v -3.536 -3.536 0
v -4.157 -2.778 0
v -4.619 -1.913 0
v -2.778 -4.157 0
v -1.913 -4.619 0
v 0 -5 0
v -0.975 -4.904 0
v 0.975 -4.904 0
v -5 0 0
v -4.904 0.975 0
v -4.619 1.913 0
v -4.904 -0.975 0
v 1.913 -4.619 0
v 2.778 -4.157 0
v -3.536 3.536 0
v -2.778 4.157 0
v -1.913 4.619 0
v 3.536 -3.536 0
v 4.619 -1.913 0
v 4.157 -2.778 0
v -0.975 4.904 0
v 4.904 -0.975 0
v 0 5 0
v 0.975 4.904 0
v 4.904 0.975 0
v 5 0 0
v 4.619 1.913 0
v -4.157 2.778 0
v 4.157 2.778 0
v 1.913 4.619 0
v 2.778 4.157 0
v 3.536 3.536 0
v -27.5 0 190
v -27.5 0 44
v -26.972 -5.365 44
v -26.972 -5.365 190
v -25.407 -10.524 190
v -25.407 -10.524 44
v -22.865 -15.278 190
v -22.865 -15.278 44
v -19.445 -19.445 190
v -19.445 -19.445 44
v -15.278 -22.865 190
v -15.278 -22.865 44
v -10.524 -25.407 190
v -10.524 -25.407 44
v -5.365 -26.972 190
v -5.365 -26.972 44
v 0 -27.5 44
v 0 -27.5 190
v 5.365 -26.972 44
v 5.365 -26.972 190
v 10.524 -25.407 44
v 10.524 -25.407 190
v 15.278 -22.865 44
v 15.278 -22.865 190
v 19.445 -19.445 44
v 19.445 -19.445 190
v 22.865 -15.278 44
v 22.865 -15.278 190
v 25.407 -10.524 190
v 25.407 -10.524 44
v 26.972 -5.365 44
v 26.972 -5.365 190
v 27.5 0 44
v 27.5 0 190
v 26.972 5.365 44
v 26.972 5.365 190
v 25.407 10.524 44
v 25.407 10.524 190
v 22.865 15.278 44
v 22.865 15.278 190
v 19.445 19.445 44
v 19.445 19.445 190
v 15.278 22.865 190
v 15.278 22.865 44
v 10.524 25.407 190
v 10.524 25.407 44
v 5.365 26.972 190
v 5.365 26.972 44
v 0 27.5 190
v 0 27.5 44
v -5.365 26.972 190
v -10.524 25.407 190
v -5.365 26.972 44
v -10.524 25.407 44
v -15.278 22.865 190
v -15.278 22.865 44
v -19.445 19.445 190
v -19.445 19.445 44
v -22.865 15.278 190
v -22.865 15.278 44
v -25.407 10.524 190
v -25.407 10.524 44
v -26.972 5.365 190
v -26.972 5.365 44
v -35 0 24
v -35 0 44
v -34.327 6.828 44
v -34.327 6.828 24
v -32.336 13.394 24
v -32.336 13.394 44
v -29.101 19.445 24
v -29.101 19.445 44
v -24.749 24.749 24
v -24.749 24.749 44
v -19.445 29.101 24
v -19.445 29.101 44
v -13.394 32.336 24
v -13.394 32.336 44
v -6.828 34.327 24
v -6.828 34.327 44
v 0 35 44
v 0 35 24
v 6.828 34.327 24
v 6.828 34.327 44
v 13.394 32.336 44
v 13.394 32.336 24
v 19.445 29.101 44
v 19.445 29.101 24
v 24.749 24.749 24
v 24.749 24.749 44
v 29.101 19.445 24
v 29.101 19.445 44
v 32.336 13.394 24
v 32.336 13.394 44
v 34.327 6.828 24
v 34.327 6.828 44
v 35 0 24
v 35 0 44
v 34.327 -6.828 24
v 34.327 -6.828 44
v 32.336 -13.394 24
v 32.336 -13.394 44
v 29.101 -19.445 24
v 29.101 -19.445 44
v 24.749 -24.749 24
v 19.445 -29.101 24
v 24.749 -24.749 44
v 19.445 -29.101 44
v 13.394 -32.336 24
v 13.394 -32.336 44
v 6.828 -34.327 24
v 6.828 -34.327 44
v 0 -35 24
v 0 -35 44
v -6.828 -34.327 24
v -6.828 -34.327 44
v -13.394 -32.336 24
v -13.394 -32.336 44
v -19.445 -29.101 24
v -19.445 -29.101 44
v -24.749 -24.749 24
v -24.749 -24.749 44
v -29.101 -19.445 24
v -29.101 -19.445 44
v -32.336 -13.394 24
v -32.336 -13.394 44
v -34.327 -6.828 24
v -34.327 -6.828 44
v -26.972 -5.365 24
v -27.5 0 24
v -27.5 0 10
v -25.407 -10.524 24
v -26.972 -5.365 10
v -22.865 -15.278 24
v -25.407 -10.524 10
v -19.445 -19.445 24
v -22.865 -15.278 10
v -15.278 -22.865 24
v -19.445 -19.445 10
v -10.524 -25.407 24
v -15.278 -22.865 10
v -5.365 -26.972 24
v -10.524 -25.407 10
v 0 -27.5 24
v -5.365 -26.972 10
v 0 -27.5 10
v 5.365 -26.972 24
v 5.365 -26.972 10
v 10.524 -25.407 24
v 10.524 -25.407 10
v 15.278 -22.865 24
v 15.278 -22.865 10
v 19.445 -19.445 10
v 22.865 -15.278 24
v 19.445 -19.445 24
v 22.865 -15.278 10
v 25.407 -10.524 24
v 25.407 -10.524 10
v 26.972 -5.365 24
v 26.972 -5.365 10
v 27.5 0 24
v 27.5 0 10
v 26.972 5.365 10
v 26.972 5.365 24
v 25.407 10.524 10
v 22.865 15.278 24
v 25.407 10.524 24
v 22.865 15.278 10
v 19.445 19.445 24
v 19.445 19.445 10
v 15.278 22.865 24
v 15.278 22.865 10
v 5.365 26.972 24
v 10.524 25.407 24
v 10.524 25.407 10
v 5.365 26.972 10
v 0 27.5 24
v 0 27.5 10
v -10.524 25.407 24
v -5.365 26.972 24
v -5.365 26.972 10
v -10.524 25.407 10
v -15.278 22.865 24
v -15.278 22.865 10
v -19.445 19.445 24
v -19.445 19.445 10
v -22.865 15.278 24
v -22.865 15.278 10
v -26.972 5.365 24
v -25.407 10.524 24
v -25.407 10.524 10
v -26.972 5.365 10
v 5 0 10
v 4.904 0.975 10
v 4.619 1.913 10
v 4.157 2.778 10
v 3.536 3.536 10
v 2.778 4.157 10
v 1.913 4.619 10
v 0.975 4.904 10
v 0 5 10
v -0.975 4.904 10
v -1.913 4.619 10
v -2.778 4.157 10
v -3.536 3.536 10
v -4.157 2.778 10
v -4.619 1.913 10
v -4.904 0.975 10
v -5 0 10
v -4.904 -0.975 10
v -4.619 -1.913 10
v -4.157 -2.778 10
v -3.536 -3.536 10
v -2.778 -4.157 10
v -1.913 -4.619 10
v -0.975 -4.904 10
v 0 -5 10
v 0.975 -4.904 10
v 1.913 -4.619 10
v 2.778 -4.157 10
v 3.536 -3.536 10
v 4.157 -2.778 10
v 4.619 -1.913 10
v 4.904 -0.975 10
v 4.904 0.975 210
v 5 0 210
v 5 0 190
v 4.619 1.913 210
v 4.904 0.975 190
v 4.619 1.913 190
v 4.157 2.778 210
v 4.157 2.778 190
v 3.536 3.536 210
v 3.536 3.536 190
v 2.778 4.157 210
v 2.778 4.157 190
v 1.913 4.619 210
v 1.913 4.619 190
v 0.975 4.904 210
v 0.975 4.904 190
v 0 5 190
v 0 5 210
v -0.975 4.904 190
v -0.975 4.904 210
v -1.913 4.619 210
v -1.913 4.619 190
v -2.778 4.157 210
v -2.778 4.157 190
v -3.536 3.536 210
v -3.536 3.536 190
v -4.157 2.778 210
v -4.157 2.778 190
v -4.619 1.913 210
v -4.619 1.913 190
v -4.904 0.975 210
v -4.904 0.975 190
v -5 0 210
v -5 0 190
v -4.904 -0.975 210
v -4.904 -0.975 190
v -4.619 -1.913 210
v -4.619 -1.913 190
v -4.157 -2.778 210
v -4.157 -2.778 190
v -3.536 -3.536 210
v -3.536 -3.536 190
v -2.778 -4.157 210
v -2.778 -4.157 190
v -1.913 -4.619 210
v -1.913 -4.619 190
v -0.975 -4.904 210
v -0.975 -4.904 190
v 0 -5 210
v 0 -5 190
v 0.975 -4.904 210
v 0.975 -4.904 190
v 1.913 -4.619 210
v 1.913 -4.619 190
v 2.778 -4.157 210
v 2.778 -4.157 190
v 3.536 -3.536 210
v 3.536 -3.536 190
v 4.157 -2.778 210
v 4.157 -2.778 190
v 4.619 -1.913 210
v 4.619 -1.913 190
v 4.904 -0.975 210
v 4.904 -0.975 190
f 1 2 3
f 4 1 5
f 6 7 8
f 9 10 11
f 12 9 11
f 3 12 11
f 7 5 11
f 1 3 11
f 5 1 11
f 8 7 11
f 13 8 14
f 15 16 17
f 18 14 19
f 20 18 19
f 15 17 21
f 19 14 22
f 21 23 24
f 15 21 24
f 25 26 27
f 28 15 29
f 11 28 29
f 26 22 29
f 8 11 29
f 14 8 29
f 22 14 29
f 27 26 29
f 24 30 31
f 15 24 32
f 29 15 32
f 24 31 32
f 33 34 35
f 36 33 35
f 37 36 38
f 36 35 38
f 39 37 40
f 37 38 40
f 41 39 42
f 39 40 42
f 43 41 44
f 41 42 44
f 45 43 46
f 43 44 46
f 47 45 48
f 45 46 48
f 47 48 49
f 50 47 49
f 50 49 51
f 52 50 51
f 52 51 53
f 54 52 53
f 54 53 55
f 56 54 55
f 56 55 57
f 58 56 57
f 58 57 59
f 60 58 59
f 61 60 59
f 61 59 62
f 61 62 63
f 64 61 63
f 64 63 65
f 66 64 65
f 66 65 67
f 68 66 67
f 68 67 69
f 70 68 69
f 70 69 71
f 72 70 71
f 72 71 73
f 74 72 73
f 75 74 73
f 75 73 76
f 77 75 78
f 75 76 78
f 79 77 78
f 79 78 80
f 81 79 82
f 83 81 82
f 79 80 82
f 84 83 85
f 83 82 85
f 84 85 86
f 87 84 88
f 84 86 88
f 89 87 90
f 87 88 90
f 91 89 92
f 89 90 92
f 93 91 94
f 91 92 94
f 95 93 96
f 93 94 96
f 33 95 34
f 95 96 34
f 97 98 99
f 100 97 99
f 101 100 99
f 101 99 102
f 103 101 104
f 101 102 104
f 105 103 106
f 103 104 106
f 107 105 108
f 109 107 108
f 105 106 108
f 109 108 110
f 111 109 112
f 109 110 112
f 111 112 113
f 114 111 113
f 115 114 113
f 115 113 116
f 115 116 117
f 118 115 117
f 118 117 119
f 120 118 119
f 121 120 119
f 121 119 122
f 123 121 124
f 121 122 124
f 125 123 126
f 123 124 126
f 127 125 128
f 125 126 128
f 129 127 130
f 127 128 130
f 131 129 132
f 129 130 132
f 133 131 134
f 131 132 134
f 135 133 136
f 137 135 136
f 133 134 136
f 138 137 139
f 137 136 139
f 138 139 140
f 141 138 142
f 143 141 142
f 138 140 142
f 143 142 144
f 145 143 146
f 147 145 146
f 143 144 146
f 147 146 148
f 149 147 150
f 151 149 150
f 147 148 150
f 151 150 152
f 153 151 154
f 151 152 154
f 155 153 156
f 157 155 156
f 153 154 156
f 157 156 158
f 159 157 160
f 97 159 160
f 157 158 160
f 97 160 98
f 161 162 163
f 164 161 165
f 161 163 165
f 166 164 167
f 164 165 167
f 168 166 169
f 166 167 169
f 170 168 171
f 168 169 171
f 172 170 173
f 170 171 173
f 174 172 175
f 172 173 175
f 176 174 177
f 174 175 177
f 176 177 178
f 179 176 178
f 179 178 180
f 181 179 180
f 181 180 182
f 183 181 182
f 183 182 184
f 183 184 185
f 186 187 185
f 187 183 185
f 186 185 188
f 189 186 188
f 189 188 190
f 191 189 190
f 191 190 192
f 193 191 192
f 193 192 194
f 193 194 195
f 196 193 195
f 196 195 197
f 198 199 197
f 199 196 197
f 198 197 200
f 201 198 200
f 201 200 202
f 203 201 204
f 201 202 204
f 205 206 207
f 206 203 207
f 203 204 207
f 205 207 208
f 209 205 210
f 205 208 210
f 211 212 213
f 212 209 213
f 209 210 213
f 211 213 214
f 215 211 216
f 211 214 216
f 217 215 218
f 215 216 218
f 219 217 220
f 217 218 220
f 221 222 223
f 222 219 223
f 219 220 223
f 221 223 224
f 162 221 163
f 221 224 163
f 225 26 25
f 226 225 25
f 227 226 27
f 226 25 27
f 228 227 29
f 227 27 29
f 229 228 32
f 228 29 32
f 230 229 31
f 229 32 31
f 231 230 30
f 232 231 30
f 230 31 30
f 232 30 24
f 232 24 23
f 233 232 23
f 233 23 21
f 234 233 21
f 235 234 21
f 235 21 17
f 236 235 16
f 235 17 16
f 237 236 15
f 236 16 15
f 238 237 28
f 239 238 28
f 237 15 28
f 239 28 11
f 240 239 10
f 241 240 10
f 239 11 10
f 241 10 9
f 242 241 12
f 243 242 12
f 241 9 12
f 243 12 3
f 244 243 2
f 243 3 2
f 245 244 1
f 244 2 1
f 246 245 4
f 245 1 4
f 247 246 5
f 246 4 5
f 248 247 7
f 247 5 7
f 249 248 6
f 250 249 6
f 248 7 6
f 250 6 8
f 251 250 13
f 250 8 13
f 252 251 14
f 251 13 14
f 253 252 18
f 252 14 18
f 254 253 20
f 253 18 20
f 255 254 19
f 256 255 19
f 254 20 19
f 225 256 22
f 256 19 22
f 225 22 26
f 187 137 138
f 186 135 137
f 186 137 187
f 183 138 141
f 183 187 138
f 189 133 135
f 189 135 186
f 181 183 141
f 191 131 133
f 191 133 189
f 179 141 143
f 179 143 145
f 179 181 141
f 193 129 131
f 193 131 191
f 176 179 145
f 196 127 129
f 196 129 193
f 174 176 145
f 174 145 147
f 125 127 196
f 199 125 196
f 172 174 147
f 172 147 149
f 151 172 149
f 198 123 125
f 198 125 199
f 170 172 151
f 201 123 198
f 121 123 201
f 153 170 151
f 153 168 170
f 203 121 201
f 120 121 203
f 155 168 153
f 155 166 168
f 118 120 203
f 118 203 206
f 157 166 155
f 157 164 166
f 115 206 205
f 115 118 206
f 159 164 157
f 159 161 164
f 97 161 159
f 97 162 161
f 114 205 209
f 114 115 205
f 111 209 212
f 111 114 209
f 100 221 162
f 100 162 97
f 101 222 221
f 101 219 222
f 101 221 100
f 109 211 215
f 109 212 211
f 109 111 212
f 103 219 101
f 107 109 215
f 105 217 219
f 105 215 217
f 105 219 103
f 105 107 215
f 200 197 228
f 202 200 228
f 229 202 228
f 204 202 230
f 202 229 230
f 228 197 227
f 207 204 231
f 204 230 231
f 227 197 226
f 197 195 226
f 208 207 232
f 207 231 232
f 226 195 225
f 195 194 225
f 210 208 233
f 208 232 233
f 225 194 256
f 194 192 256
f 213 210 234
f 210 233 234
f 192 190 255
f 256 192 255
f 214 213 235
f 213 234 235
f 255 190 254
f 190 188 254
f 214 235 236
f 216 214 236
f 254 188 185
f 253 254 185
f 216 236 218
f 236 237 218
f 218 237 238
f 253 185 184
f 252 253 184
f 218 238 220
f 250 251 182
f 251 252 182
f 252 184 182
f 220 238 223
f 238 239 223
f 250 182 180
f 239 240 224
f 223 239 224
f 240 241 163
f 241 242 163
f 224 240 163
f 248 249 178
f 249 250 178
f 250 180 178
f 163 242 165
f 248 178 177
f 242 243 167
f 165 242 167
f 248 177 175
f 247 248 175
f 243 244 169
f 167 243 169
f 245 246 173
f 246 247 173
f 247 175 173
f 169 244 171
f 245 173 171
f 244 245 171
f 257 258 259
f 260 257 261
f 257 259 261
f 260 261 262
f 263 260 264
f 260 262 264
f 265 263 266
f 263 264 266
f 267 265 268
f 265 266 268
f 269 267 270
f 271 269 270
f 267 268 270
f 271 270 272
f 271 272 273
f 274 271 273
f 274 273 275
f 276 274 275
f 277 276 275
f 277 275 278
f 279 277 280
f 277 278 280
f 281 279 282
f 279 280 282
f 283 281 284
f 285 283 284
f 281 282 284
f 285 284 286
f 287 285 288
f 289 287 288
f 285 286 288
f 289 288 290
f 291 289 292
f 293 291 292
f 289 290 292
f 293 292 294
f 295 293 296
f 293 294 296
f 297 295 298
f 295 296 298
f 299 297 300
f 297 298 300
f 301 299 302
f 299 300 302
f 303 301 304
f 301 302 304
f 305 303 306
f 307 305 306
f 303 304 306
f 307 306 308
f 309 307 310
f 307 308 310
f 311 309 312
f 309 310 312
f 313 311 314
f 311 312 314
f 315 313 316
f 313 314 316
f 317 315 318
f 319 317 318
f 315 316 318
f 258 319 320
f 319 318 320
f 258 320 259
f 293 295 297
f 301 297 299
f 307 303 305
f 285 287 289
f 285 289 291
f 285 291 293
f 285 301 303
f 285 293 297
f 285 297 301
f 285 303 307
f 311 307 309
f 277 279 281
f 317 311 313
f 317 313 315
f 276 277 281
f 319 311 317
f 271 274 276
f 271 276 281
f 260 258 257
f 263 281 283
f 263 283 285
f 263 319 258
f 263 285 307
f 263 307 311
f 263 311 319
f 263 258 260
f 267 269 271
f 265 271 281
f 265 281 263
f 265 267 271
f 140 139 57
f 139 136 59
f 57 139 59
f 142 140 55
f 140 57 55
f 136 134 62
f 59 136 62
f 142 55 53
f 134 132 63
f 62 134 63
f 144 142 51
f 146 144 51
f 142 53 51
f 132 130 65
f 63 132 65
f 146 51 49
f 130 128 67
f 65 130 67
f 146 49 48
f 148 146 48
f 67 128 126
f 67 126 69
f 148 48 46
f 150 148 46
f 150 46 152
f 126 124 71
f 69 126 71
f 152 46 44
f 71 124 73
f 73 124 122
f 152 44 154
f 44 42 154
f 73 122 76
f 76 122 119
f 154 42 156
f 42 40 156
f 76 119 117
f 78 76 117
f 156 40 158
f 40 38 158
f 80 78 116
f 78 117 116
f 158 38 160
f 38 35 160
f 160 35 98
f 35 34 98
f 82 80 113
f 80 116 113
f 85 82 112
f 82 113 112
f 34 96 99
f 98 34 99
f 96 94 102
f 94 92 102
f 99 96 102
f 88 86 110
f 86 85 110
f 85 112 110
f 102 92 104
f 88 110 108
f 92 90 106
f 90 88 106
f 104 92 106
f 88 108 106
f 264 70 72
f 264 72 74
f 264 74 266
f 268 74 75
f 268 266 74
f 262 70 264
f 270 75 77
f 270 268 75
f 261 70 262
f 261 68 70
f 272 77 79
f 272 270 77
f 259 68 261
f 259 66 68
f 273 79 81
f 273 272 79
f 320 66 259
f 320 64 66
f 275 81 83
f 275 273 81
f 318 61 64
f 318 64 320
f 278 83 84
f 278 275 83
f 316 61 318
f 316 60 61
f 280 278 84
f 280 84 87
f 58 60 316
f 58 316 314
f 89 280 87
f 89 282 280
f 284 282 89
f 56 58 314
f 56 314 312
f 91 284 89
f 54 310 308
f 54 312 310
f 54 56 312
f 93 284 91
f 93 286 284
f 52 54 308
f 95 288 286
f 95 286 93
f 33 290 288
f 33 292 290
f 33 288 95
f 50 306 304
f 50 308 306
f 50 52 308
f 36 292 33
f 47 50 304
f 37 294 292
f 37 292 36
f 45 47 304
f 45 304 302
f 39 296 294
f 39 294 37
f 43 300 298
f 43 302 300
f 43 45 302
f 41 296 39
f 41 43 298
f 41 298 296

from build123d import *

# Parameters (mm, degrees)
SKETCH1_R                = 5
BOSS_EXTRUDE1_DEPTH      = 10
SKETCH2_R                = 27.5
BOSS_EXTRUDE2_DEPTH      = 180
BOSS_EXTRUDE3_DEPTH      = 10
BOSS_EXTRUDE3_DEPTH_BACK = 10
SKETCH3_R                = 35
SKETCH5_R                = 5
BOSS_EXTRUDE4_DEPTH      = 20


with BuildPart() as part:
    # Sketch1 → Boss-Extrude1 (new body)
    with BuildSketch(Plane.XY):
        Circle(SKETCH1_R)
    extrude(amount=BOSS_EXTRUDE1_DEPTH)

    # Sketch2 → Boss-Extrude2 (add)
    with BuildSketch(Plane.XY.offset(10)):
        with Locations(Location((0, 0, 0), (0, 0, 180))):
            Circle(SKETCH2_R)
    extrude(amount=BOSS_EXTRUDE2_DEPTH)

    # Sketch3 → Boss-Extrude3 (add, two sides: drawn at the far end of the back side and taken through both)
    with BuildSketch(Plane(origin=(0, 0, 34), x_dir=(-1, 0, 0), z_dir=(0, 0, -1)).offset(-BOSS_EXTRUDE3_DEPTH_BACK)):
        Circle(SKETCH3_R)
    extrude(amount=BOSS_EXTRUDE3_DEPTH + BOSS_EXTRUDE3_DEPTH_BACK)

    # Sketch5 → Boss-Extrude4 (add)
    with BuildSketch(Plane.XY.offset(190)):
        Circle(SKETCH5_R)
    extrude(amount=BOSS_EXTRUDE4_DEPTH)


solid = part.part
